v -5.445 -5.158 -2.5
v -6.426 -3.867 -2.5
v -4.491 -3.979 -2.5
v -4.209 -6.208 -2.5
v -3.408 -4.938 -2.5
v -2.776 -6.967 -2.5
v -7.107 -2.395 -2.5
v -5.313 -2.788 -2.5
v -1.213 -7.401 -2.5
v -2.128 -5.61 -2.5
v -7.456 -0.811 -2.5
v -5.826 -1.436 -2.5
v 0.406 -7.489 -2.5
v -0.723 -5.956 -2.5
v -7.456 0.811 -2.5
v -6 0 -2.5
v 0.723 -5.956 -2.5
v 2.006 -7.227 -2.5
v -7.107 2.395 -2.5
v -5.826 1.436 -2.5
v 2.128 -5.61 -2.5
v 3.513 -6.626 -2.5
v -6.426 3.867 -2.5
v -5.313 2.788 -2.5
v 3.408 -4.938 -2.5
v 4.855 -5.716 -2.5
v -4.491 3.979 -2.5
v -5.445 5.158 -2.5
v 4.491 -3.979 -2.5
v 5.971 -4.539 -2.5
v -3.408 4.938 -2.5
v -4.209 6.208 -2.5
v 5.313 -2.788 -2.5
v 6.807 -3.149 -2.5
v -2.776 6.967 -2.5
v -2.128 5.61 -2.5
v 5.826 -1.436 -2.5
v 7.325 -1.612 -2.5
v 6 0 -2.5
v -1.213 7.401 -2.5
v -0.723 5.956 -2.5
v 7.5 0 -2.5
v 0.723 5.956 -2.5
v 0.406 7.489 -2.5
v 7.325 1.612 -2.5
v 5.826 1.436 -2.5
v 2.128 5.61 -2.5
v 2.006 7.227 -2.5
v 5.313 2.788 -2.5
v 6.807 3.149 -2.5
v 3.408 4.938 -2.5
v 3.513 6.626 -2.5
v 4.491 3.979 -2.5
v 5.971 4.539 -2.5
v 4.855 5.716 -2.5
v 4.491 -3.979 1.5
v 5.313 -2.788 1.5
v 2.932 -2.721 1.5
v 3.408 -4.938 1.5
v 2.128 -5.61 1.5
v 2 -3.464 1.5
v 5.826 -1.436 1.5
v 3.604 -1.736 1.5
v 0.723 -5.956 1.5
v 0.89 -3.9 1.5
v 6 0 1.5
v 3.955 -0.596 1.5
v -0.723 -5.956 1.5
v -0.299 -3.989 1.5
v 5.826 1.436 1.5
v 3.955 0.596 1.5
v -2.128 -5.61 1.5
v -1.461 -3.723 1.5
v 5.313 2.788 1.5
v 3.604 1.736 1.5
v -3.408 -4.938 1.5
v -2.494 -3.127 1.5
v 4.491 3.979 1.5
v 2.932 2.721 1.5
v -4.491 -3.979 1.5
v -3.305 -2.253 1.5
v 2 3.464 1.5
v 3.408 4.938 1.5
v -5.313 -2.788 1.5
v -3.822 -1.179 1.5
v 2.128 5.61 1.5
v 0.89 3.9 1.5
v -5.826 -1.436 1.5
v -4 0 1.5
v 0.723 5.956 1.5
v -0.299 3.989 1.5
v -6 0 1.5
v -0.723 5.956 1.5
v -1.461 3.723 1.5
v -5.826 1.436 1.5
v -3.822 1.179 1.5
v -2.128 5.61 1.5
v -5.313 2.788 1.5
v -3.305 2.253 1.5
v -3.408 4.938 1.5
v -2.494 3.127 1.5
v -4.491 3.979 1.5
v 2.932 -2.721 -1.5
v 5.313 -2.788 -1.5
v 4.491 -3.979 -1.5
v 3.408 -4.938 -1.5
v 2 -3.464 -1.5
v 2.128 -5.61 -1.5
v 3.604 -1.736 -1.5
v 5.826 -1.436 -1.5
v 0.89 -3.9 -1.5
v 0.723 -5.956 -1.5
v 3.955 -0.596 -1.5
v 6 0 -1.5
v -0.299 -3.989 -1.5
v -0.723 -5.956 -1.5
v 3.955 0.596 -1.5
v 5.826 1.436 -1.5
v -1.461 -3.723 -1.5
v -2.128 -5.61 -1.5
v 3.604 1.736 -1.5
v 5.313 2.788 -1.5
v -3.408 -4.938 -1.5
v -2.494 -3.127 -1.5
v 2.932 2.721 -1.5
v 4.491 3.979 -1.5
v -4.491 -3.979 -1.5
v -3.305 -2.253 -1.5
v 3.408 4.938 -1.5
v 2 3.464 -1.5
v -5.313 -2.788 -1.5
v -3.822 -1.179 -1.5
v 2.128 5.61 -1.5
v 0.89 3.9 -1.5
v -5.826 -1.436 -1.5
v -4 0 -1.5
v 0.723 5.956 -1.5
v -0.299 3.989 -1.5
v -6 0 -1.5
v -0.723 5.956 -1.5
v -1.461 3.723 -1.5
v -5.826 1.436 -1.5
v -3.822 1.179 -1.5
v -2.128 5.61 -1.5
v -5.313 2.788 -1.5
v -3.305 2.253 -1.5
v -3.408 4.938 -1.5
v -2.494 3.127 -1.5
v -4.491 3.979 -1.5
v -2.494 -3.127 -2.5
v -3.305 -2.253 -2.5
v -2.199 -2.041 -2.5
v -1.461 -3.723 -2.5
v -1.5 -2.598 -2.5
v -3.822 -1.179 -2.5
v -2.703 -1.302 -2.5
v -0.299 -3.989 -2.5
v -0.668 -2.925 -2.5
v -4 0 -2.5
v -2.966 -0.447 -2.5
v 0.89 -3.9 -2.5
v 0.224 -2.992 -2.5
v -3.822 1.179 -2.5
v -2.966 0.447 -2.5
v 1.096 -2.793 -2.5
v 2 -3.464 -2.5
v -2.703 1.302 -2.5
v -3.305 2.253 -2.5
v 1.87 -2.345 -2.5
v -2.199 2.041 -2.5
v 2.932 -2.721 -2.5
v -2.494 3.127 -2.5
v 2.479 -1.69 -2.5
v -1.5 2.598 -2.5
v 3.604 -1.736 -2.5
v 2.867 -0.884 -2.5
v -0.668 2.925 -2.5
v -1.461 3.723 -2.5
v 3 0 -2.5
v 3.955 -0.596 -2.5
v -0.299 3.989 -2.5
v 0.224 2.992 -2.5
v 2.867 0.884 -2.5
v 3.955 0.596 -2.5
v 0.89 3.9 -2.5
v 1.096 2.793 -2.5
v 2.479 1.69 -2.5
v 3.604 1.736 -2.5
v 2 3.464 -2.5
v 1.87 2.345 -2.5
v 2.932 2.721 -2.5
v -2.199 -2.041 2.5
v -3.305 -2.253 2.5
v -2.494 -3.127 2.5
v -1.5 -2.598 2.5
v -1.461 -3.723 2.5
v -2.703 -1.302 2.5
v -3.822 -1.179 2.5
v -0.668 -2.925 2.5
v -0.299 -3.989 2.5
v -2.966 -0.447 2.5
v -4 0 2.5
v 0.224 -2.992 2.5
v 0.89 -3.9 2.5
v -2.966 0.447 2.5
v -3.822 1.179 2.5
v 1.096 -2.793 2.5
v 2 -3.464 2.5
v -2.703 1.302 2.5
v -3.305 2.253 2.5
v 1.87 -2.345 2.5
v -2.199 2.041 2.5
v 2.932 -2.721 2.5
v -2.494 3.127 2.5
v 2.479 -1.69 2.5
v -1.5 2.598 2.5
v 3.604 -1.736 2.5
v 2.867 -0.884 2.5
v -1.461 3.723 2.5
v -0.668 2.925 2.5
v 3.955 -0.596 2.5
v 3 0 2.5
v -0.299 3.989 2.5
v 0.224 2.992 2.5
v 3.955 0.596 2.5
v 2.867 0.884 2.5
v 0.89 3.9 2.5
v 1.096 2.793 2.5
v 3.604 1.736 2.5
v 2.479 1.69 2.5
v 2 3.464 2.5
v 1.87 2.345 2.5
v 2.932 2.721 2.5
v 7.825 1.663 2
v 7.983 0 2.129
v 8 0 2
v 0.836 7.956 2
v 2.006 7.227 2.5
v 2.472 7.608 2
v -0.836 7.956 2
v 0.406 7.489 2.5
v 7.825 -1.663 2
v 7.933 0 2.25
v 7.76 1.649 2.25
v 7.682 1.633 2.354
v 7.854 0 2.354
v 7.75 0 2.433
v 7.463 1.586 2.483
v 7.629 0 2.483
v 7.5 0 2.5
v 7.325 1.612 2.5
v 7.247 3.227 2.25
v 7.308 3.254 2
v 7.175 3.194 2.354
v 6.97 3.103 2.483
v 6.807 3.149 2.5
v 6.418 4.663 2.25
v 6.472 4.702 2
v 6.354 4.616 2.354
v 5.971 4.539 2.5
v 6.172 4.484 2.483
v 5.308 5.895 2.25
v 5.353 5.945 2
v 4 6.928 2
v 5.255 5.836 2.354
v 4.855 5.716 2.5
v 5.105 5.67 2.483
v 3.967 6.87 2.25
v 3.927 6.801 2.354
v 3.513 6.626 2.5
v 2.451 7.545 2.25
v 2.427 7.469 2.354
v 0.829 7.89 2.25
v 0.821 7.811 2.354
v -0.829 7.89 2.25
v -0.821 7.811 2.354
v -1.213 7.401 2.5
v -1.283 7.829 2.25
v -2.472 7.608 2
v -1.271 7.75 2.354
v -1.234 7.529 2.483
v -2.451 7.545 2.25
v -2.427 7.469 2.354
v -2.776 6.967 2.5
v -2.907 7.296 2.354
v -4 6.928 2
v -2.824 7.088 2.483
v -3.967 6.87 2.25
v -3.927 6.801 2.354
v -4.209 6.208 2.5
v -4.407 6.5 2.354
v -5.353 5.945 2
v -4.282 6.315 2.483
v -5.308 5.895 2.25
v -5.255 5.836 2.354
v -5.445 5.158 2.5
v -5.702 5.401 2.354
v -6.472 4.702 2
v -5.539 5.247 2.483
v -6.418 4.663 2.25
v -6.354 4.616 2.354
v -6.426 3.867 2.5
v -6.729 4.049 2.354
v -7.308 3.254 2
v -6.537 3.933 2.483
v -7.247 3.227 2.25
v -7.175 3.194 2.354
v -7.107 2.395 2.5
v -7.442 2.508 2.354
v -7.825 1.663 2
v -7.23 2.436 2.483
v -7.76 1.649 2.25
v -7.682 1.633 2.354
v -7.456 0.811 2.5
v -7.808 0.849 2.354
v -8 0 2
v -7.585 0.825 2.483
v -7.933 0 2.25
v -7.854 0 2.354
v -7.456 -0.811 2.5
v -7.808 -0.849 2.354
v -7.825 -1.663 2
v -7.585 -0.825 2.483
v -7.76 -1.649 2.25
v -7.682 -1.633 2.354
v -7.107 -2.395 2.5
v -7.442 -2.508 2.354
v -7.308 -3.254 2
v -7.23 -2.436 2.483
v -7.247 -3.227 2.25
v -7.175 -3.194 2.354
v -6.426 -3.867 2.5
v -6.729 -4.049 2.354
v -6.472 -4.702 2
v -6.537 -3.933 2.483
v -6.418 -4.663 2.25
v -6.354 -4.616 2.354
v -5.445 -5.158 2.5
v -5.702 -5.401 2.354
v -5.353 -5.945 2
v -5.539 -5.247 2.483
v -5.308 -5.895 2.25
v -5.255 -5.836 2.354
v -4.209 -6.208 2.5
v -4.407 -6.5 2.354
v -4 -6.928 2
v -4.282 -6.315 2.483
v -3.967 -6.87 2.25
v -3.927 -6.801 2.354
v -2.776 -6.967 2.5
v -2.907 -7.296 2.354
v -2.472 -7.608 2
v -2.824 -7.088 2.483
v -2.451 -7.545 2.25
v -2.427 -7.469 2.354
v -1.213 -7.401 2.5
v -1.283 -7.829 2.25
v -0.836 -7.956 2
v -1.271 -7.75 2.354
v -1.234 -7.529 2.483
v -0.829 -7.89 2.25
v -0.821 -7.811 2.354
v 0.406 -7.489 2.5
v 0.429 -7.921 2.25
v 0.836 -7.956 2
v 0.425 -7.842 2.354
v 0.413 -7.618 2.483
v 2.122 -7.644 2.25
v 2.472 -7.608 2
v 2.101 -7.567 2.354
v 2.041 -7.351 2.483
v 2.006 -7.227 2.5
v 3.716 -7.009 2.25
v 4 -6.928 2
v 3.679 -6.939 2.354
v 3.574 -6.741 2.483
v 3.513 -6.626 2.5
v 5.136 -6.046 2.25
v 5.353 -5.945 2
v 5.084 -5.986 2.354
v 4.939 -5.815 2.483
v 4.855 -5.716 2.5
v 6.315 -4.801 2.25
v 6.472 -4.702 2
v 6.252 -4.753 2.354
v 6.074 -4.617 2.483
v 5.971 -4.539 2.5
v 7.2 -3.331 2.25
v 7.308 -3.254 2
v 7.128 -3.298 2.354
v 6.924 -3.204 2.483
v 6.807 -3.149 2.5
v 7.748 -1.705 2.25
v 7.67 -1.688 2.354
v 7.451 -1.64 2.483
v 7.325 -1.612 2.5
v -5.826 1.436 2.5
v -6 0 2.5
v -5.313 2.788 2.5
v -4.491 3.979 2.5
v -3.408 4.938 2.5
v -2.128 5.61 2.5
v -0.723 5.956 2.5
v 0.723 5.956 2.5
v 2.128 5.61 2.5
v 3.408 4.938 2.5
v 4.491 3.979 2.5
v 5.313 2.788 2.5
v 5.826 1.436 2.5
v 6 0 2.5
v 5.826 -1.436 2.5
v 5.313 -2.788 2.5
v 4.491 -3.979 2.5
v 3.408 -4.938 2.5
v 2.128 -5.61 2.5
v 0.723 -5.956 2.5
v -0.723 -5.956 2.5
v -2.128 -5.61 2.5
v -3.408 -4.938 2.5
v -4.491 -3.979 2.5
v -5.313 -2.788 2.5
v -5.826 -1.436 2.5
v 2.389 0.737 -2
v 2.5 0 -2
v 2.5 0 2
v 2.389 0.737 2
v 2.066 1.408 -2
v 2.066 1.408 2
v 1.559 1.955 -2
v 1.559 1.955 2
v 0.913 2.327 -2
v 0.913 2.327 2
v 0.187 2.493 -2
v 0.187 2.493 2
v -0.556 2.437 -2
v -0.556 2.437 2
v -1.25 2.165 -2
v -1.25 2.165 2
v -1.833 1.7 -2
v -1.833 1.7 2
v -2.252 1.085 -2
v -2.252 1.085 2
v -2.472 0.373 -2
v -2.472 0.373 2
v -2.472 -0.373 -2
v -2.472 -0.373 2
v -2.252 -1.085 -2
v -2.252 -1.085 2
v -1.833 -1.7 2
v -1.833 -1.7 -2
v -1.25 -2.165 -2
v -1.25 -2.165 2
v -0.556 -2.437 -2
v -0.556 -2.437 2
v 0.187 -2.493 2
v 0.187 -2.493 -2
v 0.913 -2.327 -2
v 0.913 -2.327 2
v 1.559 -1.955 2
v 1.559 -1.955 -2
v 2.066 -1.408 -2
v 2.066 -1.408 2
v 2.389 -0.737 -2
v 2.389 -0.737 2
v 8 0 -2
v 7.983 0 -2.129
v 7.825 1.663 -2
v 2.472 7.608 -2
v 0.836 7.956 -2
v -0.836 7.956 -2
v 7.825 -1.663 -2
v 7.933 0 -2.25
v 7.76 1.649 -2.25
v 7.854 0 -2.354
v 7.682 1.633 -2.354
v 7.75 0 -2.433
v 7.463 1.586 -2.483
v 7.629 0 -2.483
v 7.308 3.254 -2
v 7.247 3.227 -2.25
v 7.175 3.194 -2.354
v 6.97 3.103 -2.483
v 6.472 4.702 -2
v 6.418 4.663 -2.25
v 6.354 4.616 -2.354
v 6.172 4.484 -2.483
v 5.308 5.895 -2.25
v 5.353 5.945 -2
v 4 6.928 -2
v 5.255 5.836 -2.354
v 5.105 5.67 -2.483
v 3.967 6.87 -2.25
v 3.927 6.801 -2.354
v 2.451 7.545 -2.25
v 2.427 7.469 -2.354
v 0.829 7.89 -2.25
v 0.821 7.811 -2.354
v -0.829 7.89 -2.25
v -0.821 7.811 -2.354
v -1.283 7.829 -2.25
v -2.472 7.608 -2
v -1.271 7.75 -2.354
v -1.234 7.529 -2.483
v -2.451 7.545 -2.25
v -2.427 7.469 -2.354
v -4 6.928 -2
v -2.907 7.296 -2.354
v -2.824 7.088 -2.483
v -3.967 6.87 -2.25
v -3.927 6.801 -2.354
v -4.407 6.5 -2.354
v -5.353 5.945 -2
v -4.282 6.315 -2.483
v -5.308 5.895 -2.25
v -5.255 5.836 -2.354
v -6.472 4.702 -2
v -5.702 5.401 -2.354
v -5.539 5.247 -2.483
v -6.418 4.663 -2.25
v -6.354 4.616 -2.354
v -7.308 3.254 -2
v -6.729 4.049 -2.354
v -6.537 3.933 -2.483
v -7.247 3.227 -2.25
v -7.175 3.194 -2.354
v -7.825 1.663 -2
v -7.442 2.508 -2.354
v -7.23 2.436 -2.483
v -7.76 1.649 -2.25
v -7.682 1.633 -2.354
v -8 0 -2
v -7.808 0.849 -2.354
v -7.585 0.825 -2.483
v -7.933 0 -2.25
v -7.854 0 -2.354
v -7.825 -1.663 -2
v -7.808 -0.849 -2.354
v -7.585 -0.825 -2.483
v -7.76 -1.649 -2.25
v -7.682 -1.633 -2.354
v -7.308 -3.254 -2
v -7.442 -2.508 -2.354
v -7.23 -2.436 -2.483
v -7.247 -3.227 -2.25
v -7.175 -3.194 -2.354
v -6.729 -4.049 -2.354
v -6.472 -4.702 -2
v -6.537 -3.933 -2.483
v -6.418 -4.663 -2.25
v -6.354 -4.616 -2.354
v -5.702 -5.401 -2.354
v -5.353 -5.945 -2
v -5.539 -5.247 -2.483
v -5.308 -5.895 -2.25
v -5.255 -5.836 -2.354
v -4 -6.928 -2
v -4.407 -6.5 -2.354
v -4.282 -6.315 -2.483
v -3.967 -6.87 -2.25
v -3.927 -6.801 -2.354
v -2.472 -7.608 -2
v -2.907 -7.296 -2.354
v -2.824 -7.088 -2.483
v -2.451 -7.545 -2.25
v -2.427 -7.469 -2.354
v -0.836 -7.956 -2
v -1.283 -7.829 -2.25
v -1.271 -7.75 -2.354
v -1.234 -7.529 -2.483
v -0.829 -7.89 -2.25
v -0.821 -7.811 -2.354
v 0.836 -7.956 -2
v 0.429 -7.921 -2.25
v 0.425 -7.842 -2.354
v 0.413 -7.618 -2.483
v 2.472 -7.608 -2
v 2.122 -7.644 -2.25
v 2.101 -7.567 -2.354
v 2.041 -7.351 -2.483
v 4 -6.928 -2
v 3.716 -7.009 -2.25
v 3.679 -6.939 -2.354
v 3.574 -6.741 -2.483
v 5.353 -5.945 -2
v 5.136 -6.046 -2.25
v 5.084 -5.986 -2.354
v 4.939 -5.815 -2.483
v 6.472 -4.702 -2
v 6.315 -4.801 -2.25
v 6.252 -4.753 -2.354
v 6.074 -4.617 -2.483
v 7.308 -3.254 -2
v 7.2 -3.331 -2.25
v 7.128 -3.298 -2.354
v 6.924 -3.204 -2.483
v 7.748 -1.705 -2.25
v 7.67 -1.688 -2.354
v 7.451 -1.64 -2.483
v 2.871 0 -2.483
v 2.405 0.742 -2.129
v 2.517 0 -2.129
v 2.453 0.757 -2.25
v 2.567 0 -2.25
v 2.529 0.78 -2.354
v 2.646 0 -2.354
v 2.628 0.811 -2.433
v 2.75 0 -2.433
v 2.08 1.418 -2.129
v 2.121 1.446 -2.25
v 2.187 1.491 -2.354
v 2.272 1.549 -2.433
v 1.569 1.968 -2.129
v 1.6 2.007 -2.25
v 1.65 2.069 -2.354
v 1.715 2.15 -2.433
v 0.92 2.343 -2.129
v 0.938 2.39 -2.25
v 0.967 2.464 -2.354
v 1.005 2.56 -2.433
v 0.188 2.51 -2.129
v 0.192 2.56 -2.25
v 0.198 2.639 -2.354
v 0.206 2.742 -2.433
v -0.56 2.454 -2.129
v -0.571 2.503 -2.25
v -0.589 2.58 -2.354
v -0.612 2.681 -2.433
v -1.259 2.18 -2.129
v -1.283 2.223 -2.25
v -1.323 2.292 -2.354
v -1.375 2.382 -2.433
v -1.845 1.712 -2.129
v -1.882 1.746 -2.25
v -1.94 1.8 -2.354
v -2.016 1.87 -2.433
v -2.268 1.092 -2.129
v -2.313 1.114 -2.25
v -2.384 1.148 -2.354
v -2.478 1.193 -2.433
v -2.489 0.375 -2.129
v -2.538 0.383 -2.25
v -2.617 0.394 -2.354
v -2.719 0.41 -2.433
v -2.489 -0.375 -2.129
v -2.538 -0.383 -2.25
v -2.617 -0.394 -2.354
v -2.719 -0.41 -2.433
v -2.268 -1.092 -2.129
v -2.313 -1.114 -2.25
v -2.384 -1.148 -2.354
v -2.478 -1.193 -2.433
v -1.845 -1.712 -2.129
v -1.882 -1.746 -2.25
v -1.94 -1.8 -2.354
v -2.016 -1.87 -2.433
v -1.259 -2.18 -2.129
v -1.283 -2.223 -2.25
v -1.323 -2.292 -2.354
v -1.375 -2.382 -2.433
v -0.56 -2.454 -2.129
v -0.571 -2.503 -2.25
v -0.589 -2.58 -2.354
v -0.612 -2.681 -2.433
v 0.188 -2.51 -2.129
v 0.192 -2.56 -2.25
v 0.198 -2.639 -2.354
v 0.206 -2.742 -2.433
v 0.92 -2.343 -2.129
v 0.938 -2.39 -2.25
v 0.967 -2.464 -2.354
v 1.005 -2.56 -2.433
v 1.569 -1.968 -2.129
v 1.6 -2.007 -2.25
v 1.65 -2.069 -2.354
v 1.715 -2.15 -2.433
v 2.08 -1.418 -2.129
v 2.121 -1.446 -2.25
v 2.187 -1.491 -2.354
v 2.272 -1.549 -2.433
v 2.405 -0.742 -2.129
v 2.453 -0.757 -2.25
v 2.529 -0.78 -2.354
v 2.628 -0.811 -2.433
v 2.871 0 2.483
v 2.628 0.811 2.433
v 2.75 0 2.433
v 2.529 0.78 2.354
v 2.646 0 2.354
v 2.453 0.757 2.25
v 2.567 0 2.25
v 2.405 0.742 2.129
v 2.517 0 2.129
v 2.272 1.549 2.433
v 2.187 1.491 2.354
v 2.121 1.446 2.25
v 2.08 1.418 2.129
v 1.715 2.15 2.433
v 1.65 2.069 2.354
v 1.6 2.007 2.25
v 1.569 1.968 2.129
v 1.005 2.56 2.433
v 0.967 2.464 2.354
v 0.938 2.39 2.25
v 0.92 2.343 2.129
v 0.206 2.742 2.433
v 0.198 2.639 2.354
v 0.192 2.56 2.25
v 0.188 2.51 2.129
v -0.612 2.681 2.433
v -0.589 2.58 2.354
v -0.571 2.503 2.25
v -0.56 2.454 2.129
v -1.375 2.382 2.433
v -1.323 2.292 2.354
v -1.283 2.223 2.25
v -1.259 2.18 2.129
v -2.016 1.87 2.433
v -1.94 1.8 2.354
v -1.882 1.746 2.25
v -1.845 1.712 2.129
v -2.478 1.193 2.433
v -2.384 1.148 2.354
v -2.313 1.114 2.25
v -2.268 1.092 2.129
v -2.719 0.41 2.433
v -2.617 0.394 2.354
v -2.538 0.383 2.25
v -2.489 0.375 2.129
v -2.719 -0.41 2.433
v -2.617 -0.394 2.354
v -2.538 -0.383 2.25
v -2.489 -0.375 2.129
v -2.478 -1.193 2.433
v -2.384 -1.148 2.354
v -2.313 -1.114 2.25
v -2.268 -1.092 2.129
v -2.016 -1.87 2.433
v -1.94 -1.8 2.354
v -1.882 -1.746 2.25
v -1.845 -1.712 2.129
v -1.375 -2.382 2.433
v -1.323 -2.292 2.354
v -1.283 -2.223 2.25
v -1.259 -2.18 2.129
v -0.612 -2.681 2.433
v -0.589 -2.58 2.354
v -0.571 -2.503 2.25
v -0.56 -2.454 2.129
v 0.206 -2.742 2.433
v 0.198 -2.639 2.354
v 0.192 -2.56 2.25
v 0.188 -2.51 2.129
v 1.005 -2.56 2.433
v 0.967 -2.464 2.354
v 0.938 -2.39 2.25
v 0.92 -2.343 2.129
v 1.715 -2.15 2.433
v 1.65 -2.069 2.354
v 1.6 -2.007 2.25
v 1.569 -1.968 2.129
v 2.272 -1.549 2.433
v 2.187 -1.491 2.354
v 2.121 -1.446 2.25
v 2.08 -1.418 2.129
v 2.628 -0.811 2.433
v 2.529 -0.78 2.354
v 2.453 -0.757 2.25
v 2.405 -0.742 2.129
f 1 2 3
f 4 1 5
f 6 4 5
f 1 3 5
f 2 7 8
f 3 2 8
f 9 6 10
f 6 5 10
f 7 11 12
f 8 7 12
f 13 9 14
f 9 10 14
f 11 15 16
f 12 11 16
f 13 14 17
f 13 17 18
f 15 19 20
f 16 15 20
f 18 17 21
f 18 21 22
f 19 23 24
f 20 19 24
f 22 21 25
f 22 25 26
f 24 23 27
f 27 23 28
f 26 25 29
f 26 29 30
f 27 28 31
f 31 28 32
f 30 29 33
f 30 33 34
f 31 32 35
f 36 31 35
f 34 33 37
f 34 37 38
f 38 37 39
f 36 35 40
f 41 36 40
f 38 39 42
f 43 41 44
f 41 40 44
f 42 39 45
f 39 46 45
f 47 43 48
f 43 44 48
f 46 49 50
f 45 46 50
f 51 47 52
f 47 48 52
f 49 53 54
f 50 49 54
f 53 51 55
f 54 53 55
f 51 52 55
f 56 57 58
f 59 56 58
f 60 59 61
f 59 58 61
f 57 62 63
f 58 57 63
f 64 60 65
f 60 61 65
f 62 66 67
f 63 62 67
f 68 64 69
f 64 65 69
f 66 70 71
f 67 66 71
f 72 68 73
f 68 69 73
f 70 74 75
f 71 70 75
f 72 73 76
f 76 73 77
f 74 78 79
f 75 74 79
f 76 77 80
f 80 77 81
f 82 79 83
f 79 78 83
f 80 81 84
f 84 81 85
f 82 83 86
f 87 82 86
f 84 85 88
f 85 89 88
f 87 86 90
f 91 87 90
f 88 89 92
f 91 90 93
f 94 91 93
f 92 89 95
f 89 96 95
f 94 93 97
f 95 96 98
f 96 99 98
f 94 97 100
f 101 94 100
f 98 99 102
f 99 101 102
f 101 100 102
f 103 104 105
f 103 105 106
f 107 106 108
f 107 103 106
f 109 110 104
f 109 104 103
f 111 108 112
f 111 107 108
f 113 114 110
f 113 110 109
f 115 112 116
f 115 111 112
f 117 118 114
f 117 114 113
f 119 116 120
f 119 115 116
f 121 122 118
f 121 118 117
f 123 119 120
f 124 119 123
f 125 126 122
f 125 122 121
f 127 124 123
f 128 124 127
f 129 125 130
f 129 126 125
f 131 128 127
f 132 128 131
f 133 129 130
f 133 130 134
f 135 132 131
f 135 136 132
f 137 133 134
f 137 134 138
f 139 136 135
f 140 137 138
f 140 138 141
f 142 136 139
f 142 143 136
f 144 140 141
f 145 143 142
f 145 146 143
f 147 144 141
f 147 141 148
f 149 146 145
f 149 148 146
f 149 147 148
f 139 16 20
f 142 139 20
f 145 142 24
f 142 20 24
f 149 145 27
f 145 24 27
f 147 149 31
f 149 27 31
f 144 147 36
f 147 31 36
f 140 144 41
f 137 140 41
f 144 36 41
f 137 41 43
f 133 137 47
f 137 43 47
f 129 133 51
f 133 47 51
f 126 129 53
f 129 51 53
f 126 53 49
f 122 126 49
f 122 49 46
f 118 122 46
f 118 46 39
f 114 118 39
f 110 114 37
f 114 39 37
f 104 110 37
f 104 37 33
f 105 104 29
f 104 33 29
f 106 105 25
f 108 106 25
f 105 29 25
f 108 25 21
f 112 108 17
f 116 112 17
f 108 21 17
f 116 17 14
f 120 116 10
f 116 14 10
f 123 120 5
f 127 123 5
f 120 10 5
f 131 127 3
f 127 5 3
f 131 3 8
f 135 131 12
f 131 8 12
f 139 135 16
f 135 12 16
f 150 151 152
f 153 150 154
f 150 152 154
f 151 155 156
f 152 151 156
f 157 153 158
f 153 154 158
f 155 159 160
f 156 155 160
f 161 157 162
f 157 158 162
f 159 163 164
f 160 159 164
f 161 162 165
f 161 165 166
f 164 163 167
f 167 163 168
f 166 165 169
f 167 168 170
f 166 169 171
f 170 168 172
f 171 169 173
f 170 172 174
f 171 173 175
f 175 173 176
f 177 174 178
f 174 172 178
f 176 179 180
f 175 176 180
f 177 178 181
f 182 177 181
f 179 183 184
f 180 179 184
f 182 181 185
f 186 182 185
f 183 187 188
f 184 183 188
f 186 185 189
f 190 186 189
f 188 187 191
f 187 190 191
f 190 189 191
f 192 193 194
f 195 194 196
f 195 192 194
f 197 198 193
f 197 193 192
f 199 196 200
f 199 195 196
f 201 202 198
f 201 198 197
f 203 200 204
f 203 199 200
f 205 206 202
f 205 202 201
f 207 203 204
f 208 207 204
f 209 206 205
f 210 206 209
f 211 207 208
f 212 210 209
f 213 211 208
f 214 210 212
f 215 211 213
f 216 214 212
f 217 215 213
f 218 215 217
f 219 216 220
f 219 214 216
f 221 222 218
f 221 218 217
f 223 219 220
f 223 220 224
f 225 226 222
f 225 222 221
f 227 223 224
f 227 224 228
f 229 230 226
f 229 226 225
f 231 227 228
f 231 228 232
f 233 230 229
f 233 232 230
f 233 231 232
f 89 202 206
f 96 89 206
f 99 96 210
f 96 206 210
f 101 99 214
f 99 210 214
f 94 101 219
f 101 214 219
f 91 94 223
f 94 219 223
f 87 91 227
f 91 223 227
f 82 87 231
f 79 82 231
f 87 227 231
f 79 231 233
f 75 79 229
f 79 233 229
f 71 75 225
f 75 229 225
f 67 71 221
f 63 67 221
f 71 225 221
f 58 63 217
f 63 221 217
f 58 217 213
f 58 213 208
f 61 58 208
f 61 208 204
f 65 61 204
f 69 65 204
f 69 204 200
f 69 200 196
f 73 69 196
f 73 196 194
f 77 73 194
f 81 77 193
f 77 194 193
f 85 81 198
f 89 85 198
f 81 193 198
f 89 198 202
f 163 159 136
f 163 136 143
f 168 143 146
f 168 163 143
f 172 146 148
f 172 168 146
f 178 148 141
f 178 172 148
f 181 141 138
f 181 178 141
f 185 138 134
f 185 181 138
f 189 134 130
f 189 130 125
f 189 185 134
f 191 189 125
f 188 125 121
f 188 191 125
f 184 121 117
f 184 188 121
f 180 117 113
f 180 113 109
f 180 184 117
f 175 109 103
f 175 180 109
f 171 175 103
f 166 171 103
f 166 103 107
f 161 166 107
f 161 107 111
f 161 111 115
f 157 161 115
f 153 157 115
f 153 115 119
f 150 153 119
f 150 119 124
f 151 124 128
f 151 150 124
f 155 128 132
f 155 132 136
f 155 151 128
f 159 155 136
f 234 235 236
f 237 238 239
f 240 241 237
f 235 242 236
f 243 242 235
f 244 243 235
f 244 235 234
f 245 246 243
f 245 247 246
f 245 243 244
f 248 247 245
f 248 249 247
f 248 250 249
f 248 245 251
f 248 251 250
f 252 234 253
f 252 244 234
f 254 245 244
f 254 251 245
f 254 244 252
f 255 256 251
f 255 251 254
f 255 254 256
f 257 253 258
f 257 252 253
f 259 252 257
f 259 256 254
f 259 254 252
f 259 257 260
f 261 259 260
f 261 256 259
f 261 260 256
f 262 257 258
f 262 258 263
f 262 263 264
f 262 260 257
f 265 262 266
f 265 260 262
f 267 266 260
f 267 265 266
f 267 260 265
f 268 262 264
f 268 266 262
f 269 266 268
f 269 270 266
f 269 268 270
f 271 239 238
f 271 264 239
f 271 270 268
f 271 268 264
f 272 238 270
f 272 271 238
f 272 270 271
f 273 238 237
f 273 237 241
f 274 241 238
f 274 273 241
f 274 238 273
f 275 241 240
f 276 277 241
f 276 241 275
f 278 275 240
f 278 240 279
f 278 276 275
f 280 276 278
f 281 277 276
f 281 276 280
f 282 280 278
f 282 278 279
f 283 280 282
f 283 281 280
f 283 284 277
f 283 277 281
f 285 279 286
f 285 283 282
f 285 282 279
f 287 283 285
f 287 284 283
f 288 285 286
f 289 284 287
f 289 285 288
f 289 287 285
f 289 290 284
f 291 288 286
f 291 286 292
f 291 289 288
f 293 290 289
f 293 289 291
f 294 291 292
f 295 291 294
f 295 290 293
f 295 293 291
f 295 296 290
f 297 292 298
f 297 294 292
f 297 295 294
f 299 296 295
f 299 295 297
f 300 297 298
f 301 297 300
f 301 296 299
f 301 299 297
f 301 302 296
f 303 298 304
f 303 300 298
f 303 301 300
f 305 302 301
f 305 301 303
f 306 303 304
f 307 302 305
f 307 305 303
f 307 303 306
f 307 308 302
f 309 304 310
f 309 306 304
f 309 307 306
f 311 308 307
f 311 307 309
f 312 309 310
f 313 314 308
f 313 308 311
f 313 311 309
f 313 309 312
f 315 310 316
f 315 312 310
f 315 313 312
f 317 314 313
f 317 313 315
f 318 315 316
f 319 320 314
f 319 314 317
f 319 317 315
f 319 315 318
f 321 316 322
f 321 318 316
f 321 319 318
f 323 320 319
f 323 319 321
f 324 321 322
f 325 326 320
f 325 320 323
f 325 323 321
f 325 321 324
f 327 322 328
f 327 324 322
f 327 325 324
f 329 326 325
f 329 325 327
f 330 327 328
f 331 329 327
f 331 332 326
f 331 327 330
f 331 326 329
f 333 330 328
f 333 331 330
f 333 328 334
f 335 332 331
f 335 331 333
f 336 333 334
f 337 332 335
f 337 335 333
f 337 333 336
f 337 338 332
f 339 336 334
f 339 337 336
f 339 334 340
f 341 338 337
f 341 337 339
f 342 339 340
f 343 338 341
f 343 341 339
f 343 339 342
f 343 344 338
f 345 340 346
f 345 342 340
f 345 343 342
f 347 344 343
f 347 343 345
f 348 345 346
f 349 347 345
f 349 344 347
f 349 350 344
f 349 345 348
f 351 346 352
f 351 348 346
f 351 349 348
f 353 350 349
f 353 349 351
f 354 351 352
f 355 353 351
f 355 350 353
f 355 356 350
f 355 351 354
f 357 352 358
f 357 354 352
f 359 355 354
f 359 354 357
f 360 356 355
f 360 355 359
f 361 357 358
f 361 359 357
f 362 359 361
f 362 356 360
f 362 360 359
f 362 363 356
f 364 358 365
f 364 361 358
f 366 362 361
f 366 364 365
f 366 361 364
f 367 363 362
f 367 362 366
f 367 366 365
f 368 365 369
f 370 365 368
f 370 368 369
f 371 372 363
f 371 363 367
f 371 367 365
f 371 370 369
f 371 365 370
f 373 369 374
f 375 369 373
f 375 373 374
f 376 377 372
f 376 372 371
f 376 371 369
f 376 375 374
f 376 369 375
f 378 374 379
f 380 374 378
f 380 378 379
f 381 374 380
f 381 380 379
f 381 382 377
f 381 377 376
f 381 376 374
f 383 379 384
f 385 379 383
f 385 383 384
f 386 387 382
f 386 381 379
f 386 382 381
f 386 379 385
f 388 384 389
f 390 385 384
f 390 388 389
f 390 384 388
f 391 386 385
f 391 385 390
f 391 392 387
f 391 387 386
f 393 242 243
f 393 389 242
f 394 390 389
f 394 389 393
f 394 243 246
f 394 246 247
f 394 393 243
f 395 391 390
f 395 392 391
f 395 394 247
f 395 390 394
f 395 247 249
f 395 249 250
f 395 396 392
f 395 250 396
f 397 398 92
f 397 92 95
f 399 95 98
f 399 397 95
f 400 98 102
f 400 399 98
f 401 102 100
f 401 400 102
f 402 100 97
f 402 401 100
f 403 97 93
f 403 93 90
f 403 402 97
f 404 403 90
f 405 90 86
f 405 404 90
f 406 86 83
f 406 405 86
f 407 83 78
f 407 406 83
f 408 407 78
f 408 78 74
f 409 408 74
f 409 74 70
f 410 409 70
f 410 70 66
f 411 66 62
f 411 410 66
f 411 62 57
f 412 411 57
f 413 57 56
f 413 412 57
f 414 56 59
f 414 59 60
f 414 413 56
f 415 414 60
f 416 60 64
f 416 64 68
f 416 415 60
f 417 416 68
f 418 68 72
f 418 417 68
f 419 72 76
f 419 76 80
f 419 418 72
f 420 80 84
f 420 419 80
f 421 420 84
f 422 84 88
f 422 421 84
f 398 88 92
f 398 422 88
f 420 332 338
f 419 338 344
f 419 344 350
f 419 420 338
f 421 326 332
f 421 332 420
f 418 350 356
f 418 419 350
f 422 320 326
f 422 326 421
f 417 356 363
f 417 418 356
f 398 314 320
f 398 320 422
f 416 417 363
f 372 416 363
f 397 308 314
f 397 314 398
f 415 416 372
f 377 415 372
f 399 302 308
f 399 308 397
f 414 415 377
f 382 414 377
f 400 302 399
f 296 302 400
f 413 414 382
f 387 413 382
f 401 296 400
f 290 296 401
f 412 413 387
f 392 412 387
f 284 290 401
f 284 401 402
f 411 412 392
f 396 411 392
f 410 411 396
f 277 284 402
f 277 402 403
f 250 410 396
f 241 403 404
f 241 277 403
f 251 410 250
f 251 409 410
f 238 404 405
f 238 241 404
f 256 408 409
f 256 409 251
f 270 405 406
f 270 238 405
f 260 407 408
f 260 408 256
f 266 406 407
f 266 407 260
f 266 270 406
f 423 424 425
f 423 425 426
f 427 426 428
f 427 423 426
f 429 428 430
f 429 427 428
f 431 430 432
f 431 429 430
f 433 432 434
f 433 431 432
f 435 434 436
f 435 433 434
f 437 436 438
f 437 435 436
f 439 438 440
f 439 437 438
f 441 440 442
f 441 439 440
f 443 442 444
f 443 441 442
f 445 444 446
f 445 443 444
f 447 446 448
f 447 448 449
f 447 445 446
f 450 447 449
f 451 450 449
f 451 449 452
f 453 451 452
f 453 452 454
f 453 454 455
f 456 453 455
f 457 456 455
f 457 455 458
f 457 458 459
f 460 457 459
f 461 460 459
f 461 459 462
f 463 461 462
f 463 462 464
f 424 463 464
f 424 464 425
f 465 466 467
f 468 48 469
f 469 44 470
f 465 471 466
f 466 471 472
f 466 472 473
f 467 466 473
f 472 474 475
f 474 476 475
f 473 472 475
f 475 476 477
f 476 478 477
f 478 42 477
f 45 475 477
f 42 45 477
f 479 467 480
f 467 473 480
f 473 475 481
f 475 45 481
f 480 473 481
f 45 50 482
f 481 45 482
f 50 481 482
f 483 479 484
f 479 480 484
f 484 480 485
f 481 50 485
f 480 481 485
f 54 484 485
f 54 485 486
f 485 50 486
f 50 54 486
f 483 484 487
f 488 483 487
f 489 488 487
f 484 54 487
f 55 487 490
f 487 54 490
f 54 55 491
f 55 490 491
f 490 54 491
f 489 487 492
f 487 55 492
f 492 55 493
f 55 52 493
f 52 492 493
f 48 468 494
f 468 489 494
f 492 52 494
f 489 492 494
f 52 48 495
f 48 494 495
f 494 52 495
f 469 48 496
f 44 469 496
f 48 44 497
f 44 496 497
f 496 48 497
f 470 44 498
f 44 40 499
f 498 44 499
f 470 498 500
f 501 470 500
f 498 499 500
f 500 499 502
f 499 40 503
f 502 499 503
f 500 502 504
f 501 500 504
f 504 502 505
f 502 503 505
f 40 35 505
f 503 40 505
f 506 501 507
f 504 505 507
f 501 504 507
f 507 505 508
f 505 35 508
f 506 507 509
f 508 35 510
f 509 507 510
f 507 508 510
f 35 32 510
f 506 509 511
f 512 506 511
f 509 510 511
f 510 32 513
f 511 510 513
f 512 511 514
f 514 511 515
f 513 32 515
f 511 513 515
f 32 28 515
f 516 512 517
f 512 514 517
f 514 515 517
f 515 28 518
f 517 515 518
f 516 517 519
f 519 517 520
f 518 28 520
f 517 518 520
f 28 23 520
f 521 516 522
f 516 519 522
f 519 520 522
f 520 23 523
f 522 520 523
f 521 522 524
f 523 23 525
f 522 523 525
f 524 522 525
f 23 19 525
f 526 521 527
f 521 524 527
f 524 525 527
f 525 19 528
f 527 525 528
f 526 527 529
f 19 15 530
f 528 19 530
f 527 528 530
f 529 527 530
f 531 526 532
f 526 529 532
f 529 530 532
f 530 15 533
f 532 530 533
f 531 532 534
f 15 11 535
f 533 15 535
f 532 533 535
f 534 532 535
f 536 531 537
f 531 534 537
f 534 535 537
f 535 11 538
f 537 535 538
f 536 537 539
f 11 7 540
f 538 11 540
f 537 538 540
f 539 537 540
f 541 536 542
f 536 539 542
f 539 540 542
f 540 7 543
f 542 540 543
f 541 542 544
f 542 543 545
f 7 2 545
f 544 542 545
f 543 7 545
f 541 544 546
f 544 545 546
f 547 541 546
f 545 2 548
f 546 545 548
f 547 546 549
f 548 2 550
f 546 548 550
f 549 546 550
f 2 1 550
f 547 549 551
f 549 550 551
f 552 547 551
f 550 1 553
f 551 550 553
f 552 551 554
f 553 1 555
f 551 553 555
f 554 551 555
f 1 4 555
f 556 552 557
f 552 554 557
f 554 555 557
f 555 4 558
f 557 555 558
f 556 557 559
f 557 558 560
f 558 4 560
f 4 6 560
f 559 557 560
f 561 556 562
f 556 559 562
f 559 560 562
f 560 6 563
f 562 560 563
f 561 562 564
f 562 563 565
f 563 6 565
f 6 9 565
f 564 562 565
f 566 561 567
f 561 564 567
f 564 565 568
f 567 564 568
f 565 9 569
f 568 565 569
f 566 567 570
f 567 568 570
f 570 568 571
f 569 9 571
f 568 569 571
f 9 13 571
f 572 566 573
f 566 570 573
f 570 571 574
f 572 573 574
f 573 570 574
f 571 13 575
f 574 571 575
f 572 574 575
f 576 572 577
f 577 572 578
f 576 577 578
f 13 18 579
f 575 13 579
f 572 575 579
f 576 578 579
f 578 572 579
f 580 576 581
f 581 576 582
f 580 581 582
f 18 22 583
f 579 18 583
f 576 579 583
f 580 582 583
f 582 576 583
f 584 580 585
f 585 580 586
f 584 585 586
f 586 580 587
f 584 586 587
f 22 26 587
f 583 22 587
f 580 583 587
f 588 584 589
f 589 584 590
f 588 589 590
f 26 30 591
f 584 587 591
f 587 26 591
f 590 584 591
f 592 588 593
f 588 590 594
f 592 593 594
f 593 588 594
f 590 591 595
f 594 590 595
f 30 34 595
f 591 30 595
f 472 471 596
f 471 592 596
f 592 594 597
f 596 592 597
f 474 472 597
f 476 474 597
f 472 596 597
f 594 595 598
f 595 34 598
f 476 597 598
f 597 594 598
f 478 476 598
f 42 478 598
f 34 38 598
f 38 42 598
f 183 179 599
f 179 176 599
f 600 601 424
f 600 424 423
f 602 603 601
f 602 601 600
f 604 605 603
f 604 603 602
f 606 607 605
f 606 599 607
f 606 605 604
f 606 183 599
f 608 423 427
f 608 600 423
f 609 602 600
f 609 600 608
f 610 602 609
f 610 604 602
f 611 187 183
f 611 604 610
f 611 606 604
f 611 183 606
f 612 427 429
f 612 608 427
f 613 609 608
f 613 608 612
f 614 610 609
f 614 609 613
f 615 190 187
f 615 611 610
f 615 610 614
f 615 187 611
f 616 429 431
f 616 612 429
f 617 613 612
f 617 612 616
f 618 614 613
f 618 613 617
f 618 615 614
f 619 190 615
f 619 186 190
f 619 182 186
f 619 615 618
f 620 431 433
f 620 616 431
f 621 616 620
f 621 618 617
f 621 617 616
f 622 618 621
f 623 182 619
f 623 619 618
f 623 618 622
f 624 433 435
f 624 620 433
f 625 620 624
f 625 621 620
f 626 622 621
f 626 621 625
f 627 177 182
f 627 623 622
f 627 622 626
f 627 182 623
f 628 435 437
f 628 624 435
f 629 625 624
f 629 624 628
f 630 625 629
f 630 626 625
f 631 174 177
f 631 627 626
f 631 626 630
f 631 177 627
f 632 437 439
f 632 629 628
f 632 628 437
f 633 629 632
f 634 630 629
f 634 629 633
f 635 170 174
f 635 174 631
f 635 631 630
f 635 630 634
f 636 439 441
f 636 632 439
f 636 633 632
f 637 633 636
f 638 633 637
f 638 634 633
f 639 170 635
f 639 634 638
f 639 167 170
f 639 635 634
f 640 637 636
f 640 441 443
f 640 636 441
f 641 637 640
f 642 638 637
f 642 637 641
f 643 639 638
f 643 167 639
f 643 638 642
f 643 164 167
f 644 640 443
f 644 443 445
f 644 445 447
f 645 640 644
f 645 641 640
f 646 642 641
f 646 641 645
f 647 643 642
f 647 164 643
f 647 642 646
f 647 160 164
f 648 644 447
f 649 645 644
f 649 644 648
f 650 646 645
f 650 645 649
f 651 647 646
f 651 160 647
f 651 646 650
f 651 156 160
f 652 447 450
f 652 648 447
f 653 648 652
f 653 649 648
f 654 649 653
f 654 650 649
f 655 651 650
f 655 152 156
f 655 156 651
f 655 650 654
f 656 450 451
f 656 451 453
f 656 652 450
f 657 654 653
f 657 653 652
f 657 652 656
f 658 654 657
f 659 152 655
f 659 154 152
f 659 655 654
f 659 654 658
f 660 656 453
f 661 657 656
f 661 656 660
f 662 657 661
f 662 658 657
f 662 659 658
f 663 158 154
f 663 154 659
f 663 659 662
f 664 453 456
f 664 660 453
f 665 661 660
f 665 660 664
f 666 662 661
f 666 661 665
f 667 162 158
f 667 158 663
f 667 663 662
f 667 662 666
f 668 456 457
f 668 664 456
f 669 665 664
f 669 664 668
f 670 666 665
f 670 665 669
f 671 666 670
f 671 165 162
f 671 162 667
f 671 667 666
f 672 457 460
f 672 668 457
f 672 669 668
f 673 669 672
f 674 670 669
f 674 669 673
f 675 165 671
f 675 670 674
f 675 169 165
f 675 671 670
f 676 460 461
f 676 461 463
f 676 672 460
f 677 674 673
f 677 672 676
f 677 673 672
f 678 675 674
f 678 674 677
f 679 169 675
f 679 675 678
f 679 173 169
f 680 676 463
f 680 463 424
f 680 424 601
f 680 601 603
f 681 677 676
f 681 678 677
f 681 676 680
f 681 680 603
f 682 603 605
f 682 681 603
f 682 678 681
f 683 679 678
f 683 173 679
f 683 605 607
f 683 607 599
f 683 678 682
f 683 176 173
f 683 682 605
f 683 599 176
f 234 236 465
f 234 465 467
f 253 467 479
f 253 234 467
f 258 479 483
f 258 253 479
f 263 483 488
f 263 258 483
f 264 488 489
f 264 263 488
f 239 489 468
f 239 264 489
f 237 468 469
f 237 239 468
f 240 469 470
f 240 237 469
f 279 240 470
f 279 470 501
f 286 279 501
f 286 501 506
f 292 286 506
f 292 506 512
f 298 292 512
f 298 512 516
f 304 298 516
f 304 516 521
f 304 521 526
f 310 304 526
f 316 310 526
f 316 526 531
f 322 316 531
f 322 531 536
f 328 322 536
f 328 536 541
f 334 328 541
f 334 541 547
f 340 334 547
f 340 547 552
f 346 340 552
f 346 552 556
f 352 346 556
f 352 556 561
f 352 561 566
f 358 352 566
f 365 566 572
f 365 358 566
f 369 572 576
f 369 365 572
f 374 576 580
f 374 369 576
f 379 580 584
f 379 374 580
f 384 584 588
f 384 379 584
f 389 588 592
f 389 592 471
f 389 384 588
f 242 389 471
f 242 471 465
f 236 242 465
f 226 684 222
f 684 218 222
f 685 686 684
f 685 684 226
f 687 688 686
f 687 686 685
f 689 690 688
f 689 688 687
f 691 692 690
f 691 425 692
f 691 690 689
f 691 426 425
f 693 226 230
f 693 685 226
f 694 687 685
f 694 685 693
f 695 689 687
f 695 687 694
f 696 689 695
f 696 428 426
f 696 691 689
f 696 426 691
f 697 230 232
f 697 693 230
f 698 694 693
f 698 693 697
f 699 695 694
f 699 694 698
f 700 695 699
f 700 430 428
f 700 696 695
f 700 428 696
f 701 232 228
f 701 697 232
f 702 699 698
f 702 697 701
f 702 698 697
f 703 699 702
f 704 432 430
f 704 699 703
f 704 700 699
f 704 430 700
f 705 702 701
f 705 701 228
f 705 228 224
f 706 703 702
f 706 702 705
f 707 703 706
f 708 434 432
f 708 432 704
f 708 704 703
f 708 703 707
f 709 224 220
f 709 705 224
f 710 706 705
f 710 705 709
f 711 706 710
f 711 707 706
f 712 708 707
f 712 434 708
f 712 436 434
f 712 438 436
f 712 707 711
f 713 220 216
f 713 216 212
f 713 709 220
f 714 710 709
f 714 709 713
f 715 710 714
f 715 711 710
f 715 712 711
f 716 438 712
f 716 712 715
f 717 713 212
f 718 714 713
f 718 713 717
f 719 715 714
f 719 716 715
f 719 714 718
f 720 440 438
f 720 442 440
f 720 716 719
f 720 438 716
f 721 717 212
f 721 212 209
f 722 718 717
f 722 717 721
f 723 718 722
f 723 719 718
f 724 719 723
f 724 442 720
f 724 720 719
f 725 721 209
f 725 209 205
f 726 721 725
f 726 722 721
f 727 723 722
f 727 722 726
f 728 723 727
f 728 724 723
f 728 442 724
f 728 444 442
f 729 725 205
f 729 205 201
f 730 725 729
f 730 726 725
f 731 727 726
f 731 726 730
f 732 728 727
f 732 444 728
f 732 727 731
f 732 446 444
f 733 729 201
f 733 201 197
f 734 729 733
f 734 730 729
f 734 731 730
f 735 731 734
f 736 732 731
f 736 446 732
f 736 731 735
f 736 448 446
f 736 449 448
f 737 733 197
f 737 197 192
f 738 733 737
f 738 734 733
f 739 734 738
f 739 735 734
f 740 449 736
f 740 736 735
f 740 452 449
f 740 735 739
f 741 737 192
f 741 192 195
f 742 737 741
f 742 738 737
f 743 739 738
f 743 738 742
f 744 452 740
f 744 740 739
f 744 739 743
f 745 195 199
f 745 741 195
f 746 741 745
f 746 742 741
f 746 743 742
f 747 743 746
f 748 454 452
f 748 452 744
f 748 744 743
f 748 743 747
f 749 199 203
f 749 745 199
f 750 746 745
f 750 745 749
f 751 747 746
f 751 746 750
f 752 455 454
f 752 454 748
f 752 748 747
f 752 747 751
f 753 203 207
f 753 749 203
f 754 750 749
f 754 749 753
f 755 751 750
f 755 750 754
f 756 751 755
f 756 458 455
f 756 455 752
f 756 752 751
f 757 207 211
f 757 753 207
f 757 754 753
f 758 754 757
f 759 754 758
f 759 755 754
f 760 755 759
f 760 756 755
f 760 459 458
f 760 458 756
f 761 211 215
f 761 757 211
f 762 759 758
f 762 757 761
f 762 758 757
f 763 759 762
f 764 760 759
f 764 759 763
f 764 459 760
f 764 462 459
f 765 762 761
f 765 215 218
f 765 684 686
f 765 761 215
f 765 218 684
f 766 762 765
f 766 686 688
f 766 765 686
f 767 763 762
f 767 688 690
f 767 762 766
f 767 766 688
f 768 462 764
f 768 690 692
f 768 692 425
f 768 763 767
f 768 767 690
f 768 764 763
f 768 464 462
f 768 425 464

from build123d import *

# Parameters (mm, degrees)
SKETCH_3_R          = 8
SKETCH_3_R_2        = 2.5
EXTRUDE_1_DEPTH     = 2.5
FILLET_1_R          = 0.5
SKETCH_4_R          = 6
SKETCH_4_R_2        = 4
CUT_EXTRUDE_1_DEPTH = 1


with BuildPart() as part:
    # 草圖3 → 填料-伸長1 (new, symmetric)
    with BuildSketch(Plane.XY):
        Circle(SKETCH_3_R)
        Circle(SKETCH_3_R_2, mode=Mode.SUBTRACT)
    extrude(amount=EXTRUDE_1_DEPTH, both=True)

    # 圓角1
    fillet_1_edges = [part.edges().sort_by_distance(p)[0] for p in [
        (-8, 0, -2.5),
        (-8, 0, 2.5),
        (-2.5, 0, -2.5),
        (-2.5, 0, 2.5),
    ]]
    fillet(fillet_1_edges, radius=FILLET_1_R)

    # 草圖4 → 除料-伸長1 (cut)
    with BuildSketch(Plane(origin=(0, 0, -2.5), x_dir=(-1, 0, 0), z_dir=(0, 0, -1))):
        Circle(SKETCH_4_R)
        Circle(SKETCH_4_R_2, mode=Mode.SUBTRACT)
    cut_extrude_1 = extrude(amount=-CUT_EXTRUDE_1_DEPTH, mode=Mode.SUBTRACT)

    # 鏡射1: 除料-伸長1 across plane
    add(cut_extrude_1.mirror(Plane.XY), mode=Mode.SUBTRACT)


solid = part.part
